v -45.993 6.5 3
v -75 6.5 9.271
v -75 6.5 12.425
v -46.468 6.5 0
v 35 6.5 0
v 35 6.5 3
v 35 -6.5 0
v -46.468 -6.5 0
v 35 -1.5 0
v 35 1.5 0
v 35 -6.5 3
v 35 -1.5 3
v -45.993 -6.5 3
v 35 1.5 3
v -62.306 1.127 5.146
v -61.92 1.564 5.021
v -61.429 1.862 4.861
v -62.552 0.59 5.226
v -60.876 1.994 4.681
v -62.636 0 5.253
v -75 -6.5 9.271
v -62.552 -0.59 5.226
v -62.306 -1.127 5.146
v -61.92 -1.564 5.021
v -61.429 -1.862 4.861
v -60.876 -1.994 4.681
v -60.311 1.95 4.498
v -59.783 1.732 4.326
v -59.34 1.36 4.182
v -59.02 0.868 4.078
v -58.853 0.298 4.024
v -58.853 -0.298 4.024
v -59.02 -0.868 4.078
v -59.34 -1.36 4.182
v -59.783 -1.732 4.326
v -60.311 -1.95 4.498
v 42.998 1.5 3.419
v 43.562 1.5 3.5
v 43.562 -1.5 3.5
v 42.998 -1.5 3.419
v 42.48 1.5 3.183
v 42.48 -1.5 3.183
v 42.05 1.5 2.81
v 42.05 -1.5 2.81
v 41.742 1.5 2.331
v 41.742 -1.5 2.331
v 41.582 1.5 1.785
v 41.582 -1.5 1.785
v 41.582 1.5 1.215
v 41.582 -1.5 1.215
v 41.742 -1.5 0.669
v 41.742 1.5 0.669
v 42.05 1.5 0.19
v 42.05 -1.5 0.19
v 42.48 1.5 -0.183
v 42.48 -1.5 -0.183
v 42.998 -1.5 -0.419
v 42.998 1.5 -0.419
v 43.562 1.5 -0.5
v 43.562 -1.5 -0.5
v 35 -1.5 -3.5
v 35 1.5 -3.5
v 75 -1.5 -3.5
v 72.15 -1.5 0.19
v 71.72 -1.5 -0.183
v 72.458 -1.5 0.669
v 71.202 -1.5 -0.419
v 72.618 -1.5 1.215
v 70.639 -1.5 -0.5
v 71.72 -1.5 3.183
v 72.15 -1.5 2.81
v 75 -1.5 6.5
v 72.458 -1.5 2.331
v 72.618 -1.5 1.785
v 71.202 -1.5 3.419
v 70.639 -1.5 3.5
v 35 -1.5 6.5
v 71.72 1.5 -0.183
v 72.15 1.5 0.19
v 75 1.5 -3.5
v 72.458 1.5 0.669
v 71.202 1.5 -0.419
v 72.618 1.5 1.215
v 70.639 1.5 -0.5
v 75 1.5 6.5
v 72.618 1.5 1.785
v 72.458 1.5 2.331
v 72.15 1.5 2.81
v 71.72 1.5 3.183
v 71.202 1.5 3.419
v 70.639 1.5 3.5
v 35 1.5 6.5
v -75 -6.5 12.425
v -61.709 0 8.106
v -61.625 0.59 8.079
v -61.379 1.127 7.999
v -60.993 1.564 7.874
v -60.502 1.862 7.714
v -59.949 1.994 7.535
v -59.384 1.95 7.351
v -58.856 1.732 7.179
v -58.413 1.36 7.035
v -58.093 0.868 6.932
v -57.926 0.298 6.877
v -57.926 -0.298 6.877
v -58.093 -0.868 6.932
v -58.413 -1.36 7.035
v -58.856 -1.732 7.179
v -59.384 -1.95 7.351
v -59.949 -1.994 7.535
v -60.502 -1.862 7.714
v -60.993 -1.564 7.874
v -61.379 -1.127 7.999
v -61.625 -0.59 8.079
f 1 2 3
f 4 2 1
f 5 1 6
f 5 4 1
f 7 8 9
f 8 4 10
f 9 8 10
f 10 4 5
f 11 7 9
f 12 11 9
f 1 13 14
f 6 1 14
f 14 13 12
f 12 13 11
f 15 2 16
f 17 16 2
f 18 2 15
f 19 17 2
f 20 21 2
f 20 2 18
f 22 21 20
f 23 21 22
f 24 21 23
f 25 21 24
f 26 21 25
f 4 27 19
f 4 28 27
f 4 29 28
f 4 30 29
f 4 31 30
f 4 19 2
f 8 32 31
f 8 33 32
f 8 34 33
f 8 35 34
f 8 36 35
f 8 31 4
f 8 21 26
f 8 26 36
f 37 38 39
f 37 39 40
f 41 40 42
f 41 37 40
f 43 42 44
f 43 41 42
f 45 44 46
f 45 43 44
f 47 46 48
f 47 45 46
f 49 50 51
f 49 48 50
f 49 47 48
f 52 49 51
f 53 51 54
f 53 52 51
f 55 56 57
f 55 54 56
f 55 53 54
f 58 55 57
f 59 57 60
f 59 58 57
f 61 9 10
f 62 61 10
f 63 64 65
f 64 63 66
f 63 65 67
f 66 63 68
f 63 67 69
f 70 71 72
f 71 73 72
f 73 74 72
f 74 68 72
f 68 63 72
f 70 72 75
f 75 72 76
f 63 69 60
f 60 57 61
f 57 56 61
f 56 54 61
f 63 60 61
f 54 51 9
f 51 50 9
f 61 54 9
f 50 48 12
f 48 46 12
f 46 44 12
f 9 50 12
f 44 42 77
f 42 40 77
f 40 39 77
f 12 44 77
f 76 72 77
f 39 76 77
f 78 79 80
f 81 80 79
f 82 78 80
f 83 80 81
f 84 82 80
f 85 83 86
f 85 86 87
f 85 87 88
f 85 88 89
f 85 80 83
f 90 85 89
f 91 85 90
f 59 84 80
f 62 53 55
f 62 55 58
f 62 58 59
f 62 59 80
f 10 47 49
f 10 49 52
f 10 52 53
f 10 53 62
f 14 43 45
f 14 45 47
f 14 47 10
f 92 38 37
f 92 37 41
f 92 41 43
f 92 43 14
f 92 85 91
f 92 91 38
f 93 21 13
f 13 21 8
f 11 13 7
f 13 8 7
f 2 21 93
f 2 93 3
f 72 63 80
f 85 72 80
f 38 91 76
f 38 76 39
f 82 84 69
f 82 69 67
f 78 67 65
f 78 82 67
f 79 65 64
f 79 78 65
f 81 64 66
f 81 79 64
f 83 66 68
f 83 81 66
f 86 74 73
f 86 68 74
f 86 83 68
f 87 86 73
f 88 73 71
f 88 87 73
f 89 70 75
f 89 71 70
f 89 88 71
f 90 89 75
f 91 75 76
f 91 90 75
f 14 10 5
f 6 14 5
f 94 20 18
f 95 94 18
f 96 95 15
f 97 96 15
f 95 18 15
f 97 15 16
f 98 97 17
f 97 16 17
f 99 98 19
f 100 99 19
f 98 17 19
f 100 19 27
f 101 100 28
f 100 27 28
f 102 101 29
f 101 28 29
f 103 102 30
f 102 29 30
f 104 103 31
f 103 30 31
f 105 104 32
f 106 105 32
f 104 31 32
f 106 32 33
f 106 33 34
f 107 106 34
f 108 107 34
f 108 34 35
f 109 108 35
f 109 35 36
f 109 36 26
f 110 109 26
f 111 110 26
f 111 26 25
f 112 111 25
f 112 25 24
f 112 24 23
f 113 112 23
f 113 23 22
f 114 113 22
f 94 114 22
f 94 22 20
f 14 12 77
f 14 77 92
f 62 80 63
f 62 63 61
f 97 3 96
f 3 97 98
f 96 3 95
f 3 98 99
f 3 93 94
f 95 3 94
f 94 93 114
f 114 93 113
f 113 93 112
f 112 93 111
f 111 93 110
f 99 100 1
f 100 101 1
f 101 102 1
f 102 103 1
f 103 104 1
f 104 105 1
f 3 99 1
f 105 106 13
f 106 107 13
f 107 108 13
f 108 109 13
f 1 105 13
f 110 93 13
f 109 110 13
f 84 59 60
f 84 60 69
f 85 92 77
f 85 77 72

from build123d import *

# Parameters (mm, degrees)
SKETCH1_W               = 150
SKETCH1_H               = 13
BOSS_EXTRUDE1_DEPTH     = 40
CUT_EXTRUDE1_DEPTH      = 40
CUT_EXTRUDE3_DEPTH      = 86.988371307
SKETCH4_W               = 40
SKETCH4_H               = 3
BOSS_EXTRUDE2_DEPTH     = 6.5
CUT_EXTRUDE4_DEPTH      = 76.868825443
CUT_EXTRUDE4_DEPTH_BACK = 76.868825443
SKETCH5_W               = 40
SKETCH5_H               = 5
SKETCH6_W               = 40
SKETCH6_H               = 3
BOSS_EXTRUDE3_DEPTH     = 3.5
CUT_EXTRUDE6_DEPTH      = 6.5
SKETCH8_R               = 2
CUT_EXTRUDE7_DEPTH      = 6.5


with BuildPart() as part:
    # Sketch1 → Boss-Extrude1 (new body)
    with BuildSketch(Plane.XY):
        Rectangle(SKETCH1_W, SKETCH1_H)
    extrude(amount=BOSS_EXTRUDE1_DEPTH)

    # Sketch2 → Cut-Extrude1 (cut)
    with BuildSketch(Plane.XZ.offset(6.5)):
        Polygon((-75, 9.270509831), (-46.468304511, 0), (-75, 0), align=None)
    extrude(amount=-CUT_EXTRUDE1_DEPTH, mode=Mode.SUBTRACT)

    # Sketch3 → Cut-Extrude3 (cut, through all)
    with BuildSketch(Plane.XZ.offset(6.5)):
        Polygon((-75, 12.424896504), (-45.99315119, 3), (75, 3), (75, 40), (-75, 40), align=None)
    extrude(amount=-CUT_EXTRUDE3_DEPTH, mode=Mode.SUBTRACT)

    # Sketch4 → Boss-Extrude2 (add)
    with BuildSketch(Plane.XY):
        with Locations((55, 0)):
            Rectangle(SKETCH4_W, SKETCH4_H)
    extrude(amount=BOSS_EXTRUDE2_DEPTH)

    # Sketch5 → Cut-Extrude4 (cut, two sides: drawn at the far end of the back side and taken through both)
    with BuildSketch(Plane.XY.offset(3).offset(-CUT_EXTRUDE4_DEPTH_BACK)):
        with Locations((55, -4)):
            Rectangle(SKETCH5_W, SKETCH5_H)
        with Locations((55, 4)):
            Rectangle(SKETCH5_W, SKETCH5_H)
    extrude(amount=CUT_EXTRUDE4_DEPTH + CUT_EXTRUDE4_DEPTH_BACK, mode=Mode.SUBTRACT)

    # Sketch6 → Boss-Extrude3 (add)
    with BuildSketch(Plane(origin=(0, 0, 0), x_dir=(-1, 0, 0), z_dir=(0, 0, -1))):
        with Locations((-55, 0)):
            Rectangle(SKETCH6_W, SKETCH6_H)
    extrude(amount=BOSS_EXTRUDE3_DEPTH)

    # Sketch7 → Cut-Extrude6 (cut)
    with BuildSketch(Plane(origin=(0, 1.5, 0), x_dir=(1, 0, 0), z_dir=(0, 1, 0))):
        with BuildLine():
            Line((70.638691623, -3.5), (43.561509774, -3.5))
            ThreePointArc((43.561509774, -3.5), (41.561509774, -1.5), (43.561509774, 0.5))
            Line((43.561509774, 0.5), (70.638691623, 0.5))
            ThreePointArc((70.638691623, 0.5), (72.638691623, -1.5), (70.638691623, -3.5))
        make_face()
    extrude(amount=-CUT_EXTRUDE6_DEPTH, mode=Mode.SUBTRACT)

    # Sketch8 → Cut-Extrude7 (cut)
    with BuildSketch(Plane(origin=(-4.437328231, 0, -13.656692045), x_dir=(-0.9510565162951532, 0, 0.30901699437494873), z_dir=(-0.30901699437494873, 0, -0.9510565162951532))):
        with Locations((59.193983807, 0)):
            Circle(SKETCH8_R)
    extrude(amount=-CUT_EXTRUDE7_DEPTH, mode=Mode.SUBTRACT)


solid = part.part
